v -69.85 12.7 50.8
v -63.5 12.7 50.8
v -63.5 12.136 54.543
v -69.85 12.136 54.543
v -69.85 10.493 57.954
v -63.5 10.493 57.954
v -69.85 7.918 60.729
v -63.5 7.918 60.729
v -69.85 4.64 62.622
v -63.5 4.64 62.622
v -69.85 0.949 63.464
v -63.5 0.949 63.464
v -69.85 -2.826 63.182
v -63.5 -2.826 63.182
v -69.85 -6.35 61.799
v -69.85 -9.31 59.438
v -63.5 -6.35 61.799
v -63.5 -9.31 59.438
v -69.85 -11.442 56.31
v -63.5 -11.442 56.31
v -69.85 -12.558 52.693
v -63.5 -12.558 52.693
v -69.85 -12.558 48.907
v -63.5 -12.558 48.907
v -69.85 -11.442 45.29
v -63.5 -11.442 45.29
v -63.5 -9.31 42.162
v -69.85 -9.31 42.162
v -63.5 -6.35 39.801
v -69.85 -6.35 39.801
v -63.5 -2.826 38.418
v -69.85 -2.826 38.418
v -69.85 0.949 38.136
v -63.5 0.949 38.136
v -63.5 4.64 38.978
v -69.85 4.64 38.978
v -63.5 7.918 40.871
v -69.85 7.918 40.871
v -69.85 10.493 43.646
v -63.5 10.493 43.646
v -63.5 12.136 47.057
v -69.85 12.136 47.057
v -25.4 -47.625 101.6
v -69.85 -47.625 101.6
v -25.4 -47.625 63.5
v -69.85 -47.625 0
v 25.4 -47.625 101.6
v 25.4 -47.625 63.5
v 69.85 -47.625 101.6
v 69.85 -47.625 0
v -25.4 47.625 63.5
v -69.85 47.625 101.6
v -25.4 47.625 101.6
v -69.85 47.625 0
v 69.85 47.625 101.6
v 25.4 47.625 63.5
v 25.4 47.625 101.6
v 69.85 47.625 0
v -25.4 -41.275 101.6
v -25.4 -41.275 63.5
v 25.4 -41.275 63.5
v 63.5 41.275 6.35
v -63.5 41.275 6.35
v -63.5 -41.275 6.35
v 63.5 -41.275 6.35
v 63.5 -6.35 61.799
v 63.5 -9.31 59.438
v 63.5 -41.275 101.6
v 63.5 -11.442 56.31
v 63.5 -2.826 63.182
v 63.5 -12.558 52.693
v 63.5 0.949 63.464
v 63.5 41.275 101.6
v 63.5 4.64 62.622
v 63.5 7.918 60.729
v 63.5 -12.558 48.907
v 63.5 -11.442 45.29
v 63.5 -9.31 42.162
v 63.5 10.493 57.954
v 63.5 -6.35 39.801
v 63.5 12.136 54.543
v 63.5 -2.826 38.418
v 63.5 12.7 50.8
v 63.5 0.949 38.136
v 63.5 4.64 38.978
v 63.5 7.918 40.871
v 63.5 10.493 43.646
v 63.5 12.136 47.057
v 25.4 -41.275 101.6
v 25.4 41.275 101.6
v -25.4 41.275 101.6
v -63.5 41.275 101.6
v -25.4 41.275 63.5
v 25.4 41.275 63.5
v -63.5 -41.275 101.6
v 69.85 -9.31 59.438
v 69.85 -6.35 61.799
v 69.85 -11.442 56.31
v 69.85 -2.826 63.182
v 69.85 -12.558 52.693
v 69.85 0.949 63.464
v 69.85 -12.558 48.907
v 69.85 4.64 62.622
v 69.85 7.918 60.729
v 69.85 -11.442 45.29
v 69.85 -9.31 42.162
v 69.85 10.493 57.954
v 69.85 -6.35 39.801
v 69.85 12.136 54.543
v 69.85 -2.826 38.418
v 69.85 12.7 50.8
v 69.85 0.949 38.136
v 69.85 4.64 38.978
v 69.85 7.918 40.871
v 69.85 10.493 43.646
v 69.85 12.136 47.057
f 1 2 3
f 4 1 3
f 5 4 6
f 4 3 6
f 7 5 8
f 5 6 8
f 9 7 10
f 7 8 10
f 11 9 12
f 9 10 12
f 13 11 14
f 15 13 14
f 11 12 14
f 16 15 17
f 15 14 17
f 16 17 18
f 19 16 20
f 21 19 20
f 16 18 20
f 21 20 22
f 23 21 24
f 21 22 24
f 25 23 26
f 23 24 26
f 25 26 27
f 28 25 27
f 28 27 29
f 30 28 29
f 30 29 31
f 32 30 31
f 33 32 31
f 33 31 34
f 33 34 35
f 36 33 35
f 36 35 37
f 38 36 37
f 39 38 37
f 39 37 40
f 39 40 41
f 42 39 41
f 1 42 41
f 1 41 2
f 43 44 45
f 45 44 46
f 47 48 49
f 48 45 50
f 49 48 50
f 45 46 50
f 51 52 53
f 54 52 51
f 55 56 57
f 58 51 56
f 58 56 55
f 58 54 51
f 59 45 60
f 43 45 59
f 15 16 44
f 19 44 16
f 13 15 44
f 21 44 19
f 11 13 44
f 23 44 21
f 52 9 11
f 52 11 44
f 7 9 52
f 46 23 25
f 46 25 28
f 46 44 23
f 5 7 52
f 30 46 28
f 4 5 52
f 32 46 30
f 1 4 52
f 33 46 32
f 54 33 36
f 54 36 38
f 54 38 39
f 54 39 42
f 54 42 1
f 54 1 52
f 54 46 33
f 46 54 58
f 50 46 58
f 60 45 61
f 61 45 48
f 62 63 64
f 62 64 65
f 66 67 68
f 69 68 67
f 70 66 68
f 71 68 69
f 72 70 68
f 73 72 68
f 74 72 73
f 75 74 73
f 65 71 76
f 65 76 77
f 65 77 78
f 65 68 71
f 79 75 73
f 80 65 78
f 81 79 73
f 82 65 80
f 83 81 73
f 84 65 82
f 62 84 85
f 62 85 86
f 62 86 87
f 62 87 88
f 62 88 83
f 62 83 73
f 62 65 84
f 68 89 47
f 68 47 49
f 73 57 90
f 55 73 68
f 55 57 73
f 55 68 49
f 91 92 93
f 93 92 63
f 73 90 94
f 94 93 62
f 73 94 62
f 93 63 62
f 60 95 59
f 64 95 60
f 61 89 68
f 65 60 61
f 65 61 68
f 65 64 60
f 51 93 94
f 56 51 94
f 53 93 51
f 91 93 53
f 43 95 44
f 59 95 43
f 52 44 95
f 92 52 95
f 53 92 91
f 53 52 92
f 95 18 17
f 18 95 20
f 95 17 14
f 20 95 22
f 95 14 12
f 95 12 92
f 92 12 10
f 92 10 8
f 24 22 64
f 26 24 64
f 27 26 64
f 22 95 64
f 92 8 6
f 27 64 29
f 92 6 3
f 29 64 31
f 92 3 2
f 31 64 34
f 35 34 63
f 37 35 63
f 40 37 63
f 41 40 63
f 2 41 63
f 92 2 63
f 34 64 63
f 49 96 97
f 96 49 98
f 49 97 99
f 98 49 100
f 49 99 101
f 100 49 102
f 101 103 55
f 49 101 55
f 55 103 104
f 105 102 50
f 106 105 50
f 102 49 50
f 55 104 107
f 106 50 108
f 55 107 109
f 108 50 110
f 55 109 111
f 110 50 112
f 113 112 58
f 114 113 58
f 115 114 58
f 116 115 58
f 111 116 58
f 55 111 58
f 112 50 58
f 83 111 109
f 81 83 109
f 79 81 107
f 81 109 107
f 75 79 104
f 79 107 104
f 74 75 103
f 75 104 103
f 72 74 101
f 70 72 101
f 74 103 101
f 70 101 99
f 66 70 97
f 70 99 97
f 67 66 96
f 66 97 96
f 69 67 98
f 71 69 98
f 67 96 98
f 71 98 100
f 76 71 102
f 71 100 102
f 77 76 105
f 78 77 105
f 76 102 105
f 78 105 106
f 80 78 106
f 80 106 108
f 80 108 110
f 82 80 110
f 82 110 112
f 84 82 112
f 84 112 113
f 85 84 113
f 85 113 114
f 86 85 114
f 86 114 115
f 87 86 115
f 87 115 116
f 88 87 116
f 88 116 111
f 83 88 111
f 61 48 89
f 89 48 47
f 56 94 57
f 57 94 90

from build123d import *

# Parameters (mm, degrees)
F0_W     = 139.7
F0_H     = 95.25
F1_DEPTH = 101.6
F2_T     = -6.35
F3_W     = 50.8
F3_H     = 38.1
F4_DEPTH = 101.6
F5_R     = 12.7
F6_DEPTH = 177.8


with BuildPart() as f1:
    # F0 (on Top) → F1 (new body)
    with BuildSketch(Plane.XY):
        Rectangle(F0_W, F0_H)
    extrude(amount=F1_DEPTH)

    # F2
    f2_openings = [f1.faces().sort_by_distance(p)[0] for p in [
        (0, 0, 101.6),
    ]]
    offset(amount=F2_T, openings=f2_openings)

    # F3 (on face) → F4 (cut)
    with BuildSketch(Plane.XZ.offset(47.625)):
        with Locations((0, 82.55)):
            Rectangle(F3_W, F3_H)
    extrude(amount=-F4_DEPTH, mode=Mode.SUBTRACT)

    # F5 (on face) → F6 (cut)
    with BuildSketch(Plane.YZ.offset(69.85)):
        with Locations((0, 50.8)):
            Circle(F5_R)
    extrude(amount=-F6_DEPTH, mode=Mode.SUBTRACT)


solid = f1.part
